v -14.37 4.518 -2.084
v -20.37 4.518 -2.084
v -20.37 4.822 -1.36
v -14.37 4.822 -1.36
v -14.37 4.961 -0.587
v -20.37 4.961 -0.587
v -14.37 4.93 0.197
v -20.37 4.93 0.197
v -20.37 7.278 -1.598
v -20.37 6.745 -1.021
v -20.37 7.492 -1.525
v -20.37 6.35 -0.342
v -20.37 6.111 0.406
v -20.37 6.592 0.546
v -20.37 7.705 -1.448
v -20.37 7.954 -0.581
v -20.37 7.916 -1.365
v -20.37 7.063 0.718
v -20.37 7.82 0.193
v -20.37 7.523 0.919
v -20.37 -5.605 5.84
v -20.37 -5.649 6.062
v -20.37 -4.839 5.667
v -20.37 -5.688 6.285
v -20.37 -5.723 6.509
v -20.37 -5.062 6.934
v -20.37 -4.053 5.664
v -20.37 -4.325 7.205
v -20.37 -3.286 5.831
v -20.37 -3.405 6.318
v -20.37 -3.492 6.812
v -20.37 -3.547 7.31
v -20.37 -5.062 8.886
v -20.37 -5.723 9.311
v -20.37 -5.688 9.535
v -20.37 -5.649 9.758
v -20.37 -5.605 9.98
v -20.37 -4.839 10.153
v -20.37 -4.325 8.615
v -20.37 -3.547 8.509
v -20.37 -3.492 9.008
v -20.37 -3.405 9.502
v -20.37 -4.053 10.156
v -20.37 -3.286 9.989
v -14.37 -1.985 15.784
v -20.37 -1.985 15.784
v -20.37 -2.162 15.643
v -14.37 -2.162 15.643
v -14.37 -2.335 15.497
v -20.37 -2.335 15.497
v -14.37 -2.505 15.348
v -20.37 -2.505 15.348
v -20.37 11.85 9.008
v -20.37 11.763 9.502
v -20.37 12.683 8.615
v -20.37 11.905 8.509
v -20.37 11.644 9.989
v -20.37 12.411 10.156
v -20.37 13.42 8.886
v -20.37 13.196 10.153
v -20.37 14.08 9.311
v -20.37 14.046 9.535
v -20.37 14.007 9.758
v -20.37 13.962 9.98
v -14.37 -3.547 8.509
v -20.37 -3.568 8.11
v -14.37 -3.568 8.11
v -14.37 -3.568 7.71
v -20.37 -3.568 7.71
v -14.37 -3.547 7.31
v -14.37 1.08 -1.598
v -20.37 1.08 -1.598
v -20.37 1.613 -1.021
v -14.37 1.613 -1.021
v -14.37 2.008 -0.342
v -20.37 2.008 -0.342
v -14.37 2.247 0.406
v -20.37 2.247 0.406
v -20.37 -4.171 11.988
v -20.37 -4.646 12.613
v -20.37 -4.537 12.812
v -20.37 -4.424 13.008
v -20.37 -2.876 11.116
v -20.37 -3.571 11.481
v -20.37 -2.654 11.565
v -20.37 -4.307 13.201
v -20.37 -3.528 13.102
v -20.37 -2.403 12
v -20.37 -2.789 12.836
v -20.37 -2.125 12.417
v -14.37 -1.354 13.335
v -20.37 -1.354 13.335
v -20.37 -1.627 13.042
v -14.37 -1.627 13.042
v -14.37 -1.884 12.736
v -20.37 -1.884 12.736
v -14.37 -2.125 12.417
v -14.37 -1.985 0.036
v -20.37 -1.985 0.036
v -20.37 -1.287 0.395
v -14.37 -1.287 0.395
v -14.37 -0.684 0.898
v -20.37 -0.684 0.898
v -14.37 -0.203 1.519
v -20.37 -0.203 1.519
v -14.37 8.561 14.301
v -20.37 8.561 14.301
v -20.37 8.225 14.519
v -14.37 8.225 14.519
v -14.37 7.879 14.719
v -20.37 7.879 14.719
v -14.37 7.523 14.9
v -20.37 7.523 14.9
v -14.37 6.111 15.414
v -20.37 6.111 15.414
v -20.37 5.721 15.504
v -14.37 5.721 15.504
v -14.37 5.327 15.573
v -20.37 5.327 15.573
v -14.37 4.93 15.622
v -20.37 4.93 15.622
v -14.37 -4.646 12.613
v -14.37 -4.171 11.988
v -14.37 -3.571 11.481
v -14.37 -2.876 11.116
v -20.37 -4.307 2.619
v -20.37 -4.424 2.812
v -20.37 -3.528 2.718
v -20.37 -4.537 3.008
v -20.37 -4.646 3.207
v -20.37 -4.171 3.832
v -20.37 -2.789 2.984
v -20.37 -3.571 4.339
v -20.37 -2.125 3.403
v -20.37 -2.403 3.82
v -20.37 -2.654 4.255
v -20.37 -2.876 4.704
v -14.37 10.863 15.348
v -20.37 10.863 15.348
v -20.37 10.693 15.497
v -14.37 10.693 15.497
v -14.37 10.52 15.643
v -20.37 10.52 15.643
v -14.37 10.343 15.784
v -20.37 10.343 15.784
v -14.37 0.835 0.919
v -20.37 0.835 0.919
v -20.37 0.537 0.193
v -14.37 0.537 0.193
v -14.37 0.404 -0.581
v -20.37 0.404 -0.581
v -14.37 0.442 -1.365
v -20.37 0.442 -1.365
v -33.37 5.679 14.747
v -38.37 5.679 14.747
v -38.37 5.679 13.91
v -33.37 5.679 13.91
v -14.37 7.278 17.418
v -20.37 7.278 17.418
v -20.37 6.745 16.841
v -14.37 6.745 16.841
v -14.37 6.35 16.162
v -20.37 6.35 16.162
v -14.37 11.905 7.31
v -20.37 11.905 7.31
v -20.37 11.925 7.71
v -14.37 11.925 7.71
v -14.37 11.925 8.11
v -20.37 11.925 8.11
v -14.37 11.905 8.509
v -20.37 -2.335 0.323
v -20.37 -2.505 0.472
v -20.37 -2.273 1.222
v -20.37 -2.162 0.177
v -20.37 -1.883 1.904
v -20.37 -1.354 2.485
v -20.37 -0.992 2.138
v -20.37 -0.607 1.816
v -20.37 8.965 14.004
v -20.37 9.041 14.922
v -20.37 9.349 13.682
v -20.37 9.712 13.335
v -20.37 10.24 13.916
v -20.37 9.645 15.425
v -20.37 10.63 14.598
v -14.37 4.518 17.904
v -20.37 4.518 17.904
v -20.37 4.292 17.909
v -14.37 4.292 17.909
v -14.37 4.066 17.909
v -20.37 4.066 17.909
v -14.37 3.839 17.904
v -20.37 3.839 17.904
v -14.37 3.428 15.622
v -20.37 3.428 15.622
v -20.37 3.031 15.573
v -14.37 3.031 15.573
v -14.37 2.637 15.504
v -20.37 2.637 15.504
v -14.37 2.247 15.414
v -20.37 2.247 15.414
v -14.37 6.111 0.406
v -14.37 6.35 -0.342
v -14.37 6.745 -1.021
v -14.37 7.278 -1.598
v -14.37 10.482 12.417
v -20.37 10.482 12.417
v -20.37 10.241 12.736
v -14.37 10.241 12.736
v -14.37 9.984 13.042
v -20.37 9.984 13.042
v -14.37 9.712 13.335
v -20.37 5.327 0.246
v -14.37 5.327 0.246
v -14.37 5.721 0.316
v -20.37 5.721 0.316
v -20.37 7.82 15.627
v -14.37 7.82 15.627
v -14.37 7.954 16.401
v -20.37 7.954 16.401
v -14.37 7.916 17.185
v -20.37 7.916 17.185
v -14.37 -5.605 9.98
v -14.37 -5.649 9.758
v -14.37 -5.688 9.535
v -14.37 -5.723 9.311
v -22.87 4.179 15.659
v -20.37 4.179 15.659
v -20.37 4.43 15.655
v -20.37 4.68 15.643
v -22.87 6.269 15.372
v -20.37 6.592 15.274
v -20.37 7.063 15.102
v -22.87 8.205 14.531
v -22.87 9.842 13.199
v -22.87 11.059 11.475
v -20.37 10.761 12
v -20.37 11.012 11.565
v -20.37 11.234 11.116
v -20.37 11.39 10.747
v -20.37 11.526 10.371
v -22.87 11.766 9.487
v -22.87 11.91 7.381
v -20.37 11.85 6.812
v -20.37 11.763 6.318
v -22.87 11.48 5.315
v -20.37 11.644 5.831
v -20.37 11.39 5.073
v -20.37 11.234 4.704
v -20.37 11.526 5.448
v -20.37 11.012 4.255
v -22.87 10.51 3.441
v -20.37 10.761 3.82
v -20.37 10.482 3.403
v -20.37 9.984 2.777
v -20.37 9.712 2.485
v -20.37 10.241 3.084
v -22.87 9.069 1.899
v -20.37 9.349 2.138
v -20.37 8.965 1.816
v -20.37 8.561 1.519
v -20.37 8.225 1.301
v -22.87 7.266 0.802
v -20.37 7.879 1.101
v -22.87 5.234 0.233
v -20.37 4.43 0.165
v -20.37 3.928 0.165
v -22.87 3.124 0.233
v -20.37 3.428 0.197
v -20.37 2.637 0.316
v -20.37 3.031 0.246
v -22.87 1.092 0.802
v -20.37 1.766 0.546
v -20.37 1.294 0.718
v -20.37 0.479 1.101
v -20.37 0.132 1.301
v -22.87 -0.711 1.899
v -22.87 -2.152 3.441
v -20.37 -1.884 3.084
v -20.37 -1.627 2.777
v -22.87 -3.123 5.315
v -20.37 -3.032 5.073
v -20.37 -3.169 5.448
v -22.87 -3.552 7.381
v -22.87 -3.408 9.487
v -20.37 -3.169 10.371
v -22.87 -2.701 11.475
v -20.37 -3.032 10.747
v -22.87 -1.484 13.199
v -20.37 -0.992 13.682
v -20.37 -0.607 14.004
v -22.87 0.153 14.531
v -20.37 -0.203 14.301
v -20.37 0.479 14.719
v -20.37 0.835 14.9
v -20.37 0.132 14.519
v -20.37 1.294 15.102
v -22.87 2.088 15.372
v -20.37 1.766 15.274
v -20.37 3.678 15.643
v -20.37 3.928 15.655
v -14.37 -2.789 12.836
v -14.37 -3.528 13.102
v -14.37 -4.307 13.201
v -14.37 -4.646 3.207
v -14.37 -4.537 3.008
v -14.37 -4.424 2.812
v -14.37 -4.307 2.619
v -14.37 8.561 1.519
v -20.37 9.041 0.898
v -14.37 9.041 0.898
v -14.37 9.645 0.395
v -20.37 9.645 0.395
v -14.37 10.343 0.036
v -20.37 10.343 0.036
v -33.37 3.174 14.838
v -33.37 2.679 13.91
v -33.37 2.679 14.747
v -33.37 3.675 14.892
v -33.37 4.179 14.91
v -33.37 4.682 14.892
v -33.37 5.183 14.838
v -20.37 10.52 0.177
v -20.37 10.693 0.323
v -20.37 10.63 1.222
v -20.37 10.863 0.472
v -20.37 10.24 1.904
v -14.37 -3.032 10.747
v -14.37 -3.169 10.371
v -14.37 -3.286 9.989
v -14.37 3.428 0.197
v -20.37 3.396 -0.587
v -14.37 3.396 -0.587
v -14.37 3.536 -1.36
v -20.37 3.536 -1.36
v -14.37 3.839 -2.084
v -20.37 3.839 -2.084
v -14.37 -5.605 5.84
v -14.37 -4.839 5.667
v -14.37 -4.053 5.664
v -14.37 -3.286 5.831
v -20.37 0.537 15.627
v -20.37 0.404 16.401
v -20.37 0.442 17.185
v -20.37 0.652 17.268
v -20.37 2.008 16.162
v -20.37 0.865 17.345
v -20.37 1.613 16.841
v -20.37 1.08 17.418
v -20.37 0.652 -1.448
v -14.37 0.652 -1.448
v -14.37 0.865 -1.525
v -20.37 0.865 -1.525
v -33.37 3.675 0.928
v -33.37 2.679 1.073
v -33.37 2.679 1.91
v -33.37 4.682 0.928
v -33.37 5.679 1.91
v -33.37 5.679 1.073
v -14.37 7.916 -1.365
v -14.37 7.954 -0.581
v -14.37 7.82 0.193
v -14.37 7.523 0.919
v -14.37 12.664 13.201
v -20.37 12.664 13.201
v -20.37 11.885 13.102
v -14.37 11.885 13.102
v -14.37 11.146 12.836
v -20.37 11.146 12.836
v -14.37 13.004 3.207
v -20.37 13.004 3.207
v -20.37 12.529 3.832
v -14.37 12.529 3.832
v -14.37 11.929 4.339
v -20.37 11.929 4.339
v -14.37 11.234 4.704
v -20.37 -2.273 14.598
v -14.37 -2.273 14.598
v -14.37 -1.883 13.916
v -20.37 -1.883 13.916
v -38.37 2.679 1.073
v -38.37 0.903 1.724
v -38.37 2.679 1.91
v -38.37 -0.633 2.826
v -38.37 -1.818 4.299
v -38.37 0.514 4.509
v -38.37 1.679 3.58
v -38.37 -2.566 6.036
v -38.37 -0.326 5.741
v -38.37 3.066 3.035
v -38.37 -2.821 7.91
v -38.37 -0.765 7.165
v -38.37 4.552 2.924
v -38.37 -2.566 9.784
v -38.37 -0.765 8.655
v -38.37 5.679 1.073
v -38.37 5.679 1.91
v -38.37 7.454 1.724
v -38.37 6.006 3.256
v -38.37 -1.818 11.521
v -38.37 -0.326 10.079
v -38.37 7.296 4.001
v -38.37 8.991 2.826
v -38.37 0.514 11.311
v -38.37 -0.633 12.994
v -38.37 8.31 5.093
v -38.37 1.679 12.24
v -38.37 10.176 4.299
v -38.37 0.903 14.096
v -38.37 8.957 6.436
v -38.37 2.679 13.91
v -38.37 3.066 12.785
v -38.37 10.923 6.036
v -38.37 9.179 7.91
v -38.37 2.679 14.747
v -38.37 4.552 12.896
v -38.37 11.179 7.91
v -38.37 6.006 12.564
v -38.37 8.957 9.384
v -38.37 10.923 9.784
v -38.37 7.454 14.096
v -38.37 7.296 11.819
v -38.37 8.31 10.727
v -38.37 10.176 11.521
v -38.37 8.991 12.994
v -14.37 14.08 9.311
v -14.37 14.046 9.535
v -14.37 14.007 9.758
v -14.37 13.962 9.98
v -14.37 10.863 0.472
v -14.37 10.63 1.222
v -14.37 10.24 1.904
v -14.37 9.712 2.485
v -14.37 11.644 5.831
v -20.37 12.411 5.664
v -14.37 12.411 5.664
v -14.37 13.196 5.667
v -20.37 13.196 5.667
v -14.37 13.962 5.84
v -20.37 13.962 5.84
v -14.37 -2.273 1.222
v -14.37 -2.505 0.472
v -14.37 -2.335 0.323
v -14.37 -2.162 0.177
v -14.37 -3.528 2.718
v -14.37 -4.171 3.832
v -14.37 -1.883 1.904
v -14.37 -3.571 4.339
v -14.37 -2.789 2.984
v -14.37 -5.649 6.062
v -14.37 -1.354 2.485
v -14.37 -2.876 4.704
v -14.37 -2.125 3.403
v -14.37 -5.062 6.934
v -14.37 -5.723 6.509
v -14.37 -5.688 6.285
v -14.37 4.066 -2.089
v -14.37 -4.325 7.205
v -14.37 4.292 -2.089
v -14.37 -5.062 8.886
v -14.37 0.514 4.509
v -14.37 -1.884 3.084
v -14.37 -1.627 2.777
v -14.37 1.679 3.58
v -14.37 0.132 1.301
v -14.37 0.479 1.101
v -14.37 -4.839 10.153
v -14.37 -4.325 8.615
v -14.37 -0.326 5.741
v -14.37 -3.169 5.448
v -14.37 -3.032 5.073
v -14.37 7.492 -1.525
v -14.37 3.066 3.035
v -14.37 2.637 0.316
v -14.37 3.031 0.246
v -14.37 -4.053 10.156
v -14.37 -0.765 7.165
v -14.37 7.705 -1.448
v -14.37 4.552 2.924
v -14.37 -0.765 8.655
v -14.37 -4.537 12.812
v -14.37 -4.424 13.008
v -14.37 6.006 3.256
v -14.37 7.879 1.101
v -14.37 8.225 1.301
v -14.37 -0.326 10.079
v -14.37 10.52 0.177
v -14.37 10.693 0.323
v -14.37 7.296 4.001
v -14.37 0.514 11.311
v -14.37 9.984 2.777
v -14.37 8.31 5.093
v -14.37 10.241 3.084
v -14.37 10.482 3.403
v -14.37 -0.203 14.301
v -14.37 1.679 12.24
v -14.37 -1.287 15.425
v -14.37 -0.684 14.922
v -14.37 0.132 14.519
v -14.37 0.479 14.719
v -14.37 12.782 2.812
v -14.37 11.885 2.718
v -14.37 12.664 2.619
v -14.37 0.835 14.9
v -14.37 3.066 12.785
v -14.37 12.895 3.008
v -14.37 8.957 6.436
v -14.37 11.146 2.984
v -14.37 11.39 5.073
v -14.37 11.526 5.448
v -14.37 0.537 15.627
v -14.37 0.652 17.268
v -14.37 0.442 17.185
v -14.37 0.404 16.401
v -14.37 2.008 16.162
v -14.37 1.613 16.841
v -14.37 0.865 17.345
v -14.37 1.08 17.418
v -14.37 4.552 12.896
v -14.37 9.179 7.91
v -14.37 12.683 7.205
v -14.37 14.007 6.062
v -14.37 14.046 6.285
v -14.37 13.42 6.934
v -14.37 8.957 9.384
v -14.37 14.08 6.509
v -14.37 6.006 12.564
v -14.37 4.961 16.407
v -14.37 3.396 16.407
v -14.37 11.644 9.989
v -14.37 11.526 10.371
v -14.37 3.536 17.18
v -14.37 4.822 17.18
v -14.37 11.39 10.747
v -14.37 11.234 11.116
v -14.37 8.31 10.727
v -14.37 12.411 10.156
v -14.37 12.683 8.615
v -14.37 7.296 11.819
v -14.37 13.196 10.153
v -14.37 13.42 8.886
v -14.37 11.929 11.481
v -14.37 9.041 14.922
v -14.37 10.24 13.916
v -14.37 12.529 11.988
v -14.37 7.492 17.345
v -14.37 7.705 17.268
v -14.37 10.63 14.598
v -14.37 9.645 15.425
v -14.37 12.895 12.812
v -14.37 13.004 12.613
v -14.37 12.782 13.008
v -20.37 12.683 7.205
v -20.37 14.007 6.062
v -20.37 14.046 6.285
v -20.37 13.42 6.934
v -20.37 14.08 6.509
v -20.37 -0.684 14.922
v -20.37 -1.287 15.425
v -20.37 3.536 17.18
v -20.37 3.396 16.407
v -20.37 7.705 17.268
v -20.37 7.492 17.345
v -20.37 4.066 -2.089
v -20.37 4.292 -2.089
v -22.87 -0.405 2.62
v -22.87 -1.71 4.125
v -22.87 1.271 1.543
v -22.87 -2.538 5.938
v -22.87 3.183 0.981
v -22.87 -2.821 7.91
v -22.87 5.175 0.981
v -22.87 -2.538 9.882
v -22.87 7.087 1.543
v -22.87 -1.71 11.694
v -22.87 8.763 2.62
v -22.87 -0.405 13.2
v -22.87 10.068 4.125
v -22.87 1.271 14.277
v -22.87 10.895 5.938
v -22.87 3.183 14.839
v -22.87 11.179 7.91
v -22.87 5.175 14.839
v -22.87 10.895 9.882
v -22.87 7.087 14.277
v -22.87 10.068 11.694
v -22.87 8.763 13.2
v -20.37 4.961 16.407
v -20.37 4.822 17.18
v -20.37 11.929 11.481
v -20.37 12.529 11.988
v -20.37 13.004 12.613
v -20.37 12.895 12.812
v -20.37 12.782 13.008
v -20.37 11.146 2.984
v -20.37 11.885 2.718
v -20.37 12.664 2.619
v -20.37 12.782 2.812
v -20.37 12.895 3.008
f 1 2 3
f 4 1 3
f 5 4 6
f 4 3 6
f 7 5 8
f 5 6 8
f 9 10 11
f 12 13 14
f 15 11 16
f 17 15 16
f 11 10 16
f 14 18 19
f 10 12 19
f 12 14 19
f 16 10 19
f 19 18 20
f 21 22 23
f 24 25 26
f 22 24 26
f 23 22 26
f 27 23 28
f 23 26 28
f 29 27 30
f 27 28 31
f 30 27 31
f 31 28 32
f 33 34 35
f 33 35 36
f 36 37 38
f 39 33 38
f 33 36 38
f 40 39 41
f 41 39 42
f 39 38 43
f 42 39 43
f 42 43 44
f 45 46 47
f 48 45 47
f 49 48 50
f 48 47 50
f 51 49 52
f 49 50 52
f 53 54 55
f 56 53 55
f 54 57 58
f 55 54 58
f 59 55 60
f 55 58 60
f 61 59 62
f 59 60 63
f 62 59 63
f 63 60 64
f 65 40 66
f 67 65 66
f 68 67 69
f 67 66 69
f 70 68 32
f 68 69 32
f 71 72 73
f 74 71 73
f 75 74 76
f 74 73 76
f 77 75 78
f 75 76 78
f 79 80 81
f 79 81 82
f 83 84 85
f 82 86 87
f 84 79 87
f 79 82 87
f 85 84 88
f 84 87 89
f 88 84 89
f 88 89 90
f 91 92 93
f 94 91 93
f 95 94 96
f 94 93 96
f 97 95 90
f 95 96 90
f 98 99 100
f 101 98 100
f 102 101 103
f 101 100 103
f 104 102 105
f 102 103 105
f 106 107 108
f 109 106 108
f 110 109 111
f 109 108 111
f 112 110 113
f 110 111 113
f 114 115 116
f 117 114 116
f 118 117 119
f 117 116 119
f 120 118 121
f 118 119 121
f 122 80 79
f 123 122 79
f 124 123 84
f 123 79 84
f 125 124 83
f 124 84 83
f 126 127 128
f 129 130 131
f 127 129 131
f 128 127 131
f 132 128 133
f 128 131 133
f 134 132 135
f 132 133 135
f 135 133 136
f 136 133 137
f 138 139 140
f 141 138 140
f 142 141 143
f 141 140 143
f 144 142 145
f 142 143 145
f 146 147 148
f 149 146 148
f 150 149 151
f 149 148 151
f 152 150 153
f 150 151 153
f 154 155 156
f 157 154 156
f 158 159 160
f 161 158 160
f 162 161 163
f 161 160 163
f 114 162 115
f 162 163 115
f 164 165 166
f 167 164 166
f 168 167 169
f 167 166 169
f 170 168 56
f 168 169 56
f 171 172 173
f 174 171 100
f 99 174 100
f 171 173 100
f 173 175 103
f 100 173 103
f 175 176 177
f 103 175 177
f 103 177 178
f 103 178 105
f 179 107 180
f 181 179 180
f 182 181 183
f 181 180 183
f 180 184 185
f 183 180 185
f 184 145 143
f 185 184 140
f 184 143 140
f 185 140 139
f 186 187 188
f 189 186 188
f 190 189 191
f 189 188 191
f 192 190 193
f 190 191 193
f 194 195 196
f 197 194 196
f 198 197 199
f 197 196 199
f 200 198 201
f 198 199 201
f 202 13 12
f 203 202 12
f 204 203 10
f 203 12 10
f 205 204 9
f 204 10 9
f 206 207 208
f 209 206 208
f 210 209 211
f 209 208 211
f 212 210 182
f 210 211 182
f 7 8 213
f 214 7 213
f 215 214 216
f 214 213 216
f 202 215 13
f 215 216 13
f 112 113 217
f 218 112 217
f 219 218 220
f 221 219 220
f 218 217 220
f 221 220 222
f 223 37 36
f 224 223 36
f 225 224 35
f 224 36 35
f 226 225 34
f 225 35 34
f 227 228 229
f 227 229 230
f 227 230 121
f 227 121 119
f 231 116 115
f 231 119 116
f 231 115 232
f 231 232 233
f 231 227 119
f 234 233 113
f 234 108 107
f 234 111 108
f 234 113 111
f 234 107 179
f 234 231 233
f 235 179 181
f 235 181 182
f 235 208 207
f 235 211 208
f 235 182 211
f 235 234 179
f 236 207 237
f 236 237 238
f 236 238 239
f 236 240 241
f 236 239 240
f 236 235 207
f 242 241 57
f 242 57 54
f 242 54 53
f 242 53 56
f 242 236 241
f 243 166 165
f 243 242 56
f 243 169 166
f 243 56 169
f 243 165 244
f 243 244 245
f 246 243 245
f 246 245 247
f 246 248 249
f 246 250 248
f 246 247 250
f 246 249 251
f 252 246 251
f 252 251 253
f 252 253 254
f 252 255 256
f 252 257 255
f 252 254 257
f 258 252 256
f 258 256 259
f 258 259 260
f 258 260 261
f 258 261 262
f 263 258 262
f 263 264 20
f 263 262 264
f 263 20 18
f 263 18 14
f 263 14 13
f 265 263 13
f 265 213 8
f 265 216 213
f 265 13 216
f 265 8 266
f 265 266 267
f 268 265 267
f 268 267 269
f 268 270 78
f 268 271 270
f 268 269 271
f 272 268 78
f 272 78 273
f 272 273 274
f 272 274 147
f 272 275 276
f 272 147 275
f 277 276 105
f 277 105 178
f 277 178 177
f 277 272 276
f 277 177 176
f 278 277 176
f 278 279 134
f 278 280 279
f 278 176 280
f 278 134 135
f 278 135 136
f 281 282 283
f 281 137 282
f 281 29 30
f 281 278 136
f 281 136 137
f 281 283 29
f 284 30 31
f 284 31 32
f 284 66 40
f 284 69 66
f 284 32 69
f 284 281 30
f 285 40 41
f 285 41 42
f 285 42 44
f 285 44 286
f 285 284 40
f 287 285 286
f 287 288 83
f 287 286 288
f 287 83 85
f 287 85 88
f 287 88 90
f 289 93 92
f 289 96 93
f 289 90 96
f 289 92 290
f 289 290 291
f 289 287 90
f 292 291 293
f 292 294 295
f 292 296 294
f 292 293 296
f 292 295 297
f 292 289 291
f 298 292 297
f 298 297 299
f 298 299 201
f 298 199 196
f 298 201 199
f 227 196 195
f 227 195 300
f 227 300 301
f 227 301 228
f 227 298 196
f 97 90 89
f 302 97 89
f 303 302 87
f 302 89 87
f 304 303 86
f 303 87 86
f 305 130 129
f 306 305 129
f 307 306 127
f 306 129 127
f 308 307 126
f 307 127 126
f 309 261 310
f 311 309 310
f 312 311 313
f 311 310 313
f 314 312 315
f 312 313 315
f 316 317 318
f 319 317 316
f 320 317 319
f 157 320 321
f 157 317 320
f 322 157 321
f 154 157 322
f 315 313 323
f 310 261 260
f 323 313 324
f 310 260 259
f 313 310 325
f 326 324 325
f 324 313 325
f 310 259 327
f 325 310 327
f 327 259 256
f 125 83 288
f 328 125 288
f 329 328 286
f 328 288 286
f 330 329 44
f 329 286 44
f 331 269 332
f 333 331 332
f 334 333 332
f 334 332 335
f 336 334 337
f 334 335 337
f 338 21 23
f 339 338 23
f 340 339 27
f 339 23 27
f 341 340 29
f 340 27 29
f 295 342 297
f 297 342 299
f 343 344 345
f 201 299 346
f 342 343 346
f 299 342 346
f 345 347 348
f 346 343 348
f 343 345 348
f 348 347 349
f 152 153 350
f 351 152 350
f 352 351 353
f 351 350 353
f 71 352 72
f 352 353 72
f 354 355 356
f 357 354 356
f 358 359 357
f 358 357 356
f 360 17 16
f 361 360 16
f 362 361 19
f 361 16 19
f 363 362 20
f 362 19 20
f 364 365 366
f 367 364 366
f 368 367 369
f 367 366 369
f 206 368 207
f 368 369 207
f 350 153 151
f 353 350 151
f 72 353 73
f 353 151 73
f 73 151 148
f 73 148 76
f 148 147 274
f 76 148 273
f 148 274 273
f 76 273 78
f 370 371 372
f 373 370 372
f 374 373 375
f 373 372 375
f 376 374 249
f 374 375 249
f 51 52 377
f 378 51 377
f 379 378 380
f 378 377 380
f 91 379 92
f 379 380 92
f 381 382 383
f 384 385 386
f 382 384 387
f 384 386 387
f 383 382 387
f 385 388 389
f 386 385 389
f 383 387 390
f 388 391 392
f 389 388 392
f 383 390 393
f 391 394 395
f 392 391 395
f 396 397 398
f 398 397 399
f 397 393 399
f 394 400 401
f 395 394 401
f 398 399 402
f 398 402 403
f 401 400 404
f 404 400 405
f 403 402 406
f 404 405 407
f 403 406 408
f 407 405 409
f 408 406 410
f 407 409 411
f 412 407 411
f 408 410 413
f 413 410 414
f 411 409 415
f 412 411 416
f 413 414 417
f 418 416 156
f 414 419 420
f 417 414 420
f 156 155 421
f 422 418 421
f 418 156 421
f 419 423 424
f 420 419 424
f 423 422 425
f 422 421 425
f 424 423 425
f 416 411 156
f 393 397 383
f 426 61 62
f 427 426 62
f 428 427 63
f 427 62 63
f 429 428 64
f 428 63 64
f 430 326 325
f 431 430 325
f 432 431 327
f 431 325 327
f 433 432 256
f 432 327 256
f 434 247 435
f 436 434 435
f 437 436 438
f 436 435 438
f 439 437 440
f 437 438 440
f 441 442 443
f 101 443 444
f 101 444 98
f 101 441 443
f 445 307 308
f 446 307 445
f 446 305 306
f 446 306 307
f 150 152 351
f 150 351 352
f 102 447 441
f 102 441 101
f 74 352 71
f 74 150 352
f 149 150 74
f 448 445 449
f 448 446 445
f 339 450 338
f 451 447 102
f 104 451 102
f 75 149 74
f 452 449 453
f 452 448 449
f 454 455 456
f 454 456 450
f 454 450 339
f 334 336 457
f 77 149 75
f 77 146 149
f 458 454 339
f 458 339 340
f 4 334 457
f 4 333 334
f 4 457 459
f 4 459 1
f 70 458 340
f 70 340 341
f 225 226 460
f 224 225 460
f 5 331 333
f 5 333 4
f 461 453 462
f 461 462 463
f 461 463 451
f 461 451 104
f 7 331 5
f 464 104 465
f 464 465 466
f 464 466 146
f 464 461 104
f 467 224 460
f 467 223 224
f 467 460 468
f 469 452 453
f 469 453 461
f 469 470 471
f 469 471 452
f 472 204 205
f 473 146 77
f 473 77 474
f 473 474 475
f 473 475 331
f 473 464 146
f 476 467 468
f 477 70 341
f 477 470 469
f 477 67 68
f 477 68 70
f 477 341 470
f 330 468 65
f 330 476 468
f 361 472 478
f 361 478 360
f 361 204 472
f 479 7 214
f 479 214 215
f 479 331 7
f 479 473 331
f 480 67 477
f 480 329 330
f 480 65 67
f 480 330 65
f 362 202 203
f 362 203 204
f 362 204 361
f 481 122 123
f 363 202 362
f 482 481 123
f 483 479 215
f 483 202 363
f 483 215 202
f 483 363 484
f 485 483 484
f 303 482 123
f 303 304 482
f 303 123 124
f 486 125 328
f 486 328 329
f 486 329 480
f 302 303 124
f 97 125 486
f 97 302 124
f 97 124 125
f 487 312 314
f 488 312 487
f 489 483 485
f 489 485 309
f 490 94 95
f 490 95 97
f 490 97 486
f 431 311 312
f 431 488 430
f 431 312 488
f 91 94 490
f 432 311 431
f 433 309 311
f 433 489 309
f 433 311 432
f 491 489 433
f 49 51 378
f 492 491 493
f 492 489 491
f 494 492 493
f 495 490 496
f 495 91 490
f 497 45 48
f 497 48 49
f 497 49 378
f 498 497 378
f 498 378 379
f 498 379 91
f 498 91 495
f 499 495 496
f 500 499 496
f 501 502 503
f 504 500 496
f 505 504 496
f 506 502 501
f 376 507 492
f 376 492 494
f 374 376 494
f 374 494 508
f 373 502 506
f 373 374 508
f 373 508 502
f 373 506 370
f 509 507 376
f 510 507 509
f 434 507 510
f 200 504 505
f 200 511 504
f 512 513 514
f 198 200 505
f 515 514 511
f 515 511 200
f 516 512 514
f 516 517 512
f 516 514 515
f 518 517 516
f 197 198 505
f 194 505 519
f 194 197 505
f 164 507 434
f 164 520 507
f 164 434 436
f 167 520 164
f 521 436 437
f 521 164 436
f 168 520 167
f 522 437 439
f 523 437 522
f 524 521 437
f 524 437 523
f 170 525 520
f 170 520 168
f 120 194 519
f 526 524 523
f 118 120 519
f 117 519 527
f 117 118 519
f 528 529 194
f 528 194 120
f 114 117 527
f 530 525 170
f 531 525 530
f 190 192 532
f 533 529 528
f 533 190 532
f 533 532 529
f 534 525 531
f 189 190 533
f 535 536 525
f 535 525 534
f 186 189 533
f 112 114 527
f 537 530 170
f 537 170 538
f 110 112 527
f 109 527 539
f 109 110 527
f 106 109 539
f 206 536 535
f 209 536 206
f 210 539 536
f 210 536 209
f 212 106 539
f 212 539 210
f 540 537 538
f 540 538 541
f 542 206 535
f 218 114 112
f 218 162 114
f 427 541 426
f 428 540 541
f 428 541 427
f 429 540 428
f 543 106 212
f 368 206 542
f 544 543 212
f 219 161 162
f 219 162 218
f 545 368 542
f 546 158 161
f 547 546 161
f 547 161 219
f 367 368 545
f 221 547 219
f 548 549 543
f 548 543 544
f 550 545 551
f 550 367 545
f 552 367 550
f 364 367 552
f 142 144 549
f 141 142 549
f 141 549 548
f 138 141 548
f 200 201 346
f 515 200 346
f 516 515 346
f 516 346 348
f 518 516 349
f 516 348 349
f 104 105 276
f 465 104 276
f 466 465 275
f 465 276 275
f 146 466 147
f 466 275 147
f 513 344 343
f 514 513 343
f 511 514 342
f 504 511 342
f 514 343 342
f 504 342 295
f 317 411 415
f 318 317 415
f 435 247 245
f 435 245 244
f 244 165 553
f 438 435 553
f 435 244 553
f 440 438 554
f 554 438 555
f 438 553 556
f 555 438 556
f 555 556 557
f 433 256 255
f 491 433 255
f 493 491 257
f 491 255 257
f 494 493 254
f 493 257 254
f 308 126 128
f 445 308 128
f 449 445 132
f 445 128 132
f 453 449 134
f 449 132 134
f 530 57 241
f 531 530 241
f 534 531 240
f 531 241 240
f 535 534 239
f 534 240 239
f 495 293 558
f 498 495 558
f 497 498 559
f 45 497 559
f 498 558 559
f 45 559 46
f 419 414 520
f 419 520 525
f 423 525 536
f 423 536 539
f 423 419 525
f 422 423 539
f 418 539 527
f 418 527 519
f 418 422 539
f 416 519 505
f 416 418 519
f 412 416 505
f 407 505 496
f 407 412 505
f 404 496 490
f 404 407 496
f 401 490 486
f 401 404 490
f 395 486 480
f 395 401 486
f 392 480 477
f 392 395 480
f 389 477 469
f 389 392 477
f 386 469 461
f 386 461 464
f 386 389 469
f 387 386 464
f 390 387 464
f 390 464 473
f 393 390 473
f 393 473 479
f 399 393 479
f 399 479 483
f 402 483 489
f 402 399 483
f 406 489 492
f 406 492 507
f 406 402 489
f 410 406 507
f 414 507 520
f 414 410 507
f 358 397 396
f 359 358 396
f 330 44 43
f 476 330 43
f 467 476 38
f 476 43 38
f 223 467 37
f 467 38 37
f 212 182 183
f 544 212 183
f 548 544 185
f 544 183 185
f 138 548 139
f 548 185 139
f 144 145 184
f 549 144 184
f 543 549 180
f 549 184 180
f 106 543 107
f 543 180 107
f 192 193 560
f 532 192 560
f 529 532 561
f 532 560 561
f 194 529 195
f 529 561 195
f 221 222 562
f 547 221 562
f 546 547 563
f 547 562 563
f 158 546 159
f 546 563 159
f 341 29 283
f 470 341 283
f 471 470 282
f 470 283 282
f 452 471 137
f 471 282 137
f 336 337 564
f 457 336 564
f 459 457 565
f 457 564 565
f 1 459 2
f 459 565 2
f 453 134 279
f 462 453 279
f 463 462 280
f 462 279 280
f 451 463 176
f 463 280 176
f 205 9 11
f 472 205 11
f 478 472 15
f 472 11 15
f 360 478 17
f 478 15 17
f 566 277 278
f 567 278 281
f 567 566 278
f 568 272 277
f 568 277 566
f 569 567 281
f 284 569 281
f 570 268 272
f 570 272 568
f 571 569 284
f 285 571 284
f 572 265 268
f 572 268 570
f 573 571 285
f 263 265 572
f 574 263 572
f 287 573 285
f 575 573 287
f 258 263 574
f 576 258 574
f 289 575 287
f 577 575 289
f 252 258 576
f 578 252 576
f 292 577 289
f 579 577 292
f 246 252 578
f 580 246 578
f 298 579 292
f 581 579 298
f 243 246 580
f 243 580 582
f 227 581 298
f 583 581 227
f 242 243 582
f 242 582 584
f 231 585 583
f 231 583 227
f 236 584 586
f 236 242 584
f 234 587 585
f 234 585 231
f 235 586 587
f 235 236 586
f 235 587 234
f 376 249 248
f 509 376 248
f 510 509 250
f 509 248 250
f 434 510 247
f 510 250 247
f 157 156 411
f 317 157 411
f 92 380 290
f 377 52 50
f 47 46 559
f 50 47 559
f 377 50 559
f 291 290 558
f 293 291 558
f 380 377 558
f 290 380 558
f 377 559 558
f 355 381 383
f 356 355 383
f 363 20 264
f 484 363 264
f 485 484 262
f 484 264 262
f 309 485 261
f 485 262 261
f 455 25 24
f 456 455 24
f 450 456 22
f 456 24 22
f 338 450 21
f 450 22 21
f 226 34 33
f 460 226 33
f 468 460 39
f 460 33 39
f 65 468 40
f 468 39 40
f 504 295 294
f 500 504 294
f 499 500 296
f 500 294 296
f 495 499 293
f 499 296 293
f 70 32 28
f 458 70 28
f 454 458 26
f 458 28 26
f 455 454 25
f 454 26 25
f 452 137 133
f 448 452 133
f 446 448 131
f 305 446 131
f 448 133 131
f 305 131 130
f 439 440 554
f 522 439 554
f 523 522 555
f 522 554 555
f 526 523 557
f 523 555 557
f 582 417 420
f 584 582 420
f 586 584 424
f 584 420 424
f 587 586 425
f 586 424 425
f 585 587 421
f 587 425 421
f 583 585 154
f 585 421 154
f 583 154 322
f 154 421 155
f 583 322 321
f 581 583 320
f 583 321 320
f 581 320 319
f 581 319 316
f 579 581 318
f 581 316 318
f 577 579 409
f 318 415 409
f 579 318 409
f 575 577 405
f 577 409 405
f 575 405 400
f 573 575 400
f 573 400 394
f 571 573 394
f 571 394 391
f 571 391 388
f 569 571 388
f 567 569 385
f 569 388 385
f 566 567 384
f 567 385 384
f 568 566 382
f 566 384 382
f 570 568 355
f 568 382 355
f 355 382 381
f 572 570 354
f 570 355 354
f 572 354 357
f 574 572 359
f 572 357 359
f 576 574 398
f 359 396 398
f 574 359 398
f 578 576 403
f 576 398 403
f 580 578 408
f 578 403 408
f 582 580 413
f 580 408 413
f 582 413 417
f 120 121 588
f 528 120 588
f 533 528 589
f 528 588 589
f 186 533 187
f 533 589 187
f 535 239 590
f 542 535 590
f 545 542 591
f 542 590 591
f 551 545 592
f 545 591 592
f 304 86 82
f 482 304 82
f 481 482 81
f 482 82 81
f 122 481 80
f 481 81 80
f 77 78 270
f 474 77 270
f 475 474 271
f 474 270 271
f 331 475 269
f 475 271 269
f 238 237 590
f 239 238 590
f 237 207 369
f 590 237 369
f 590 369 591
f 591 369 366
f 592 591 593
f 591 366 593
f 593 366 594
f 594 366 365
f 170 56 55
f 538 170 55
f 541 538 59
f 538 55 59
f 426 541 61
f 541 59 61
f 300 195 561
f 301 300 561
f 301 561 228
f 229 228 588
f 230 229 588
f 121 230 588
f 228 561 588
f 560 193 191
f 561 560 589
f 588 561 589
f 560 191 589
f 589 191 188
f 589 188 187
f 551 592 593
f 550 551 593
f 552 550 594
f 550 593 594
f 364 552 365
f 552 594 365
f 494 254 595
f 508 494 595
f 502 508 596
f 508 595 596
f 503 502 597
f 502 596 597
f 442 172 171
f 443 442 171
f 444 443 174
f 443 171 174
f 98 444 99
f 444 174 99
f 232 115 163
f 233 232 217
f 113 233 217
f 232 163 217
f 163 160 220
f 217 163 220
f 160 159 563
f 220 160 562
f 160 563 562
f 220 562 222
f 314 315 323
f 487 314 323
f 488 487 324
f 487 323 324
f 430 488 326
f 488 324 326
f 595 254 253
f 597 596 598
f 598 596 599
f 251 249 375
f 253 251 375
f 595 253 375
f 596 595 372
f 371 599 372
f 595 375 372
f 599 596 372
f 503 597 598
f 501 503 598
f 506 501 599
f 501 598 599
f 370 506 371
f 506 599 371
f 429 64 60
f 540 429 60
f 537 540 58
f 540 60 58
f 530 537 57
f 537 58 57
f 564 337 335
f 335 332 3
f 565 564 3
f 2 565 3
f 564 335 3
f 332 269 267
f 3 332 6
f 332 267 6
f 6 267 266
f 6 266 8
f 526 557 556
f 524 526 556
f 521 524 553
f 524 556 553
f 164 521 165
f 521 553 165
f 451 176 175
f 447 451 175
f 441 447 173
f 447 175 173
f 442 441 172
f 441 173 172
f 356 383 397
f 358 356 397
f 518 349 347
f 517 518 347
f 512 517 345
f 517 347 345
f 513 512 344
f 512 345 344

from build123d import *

# Parameters (mm, degrees)
SPUR_START                = -38.37009116
SPUR_GEAR_ISO_OUTLINE_R   = 7
SPUR_GEAR_ISO_OUTLINE_R_2 = 5
SPUR_GEAR_ISO_DEPTH       = 24.0000508
SPUR_START_2              = -20.37004036
SPUR_GEAR_ISO_2_OUTLINE_R = 7
SPUR_GEAR_ISO_2_DEPTH     = 6
CUT_EXTRUDE1_DEPTH        = 5
BOSS_EXTRUDE1_START       = 2.5
SKETCH2_R                 = 7.749
SKETCH2_R_2               = 7
BOSS_EXTRUDE1_DEPTH       = 2.5


# Read off the part's stored shape, not the designer's step: spur gear_iso
with BuildPart() as part:
    # spur gear_iso outline → spur gear_iso (new body)
    with BuildSketch(Plane.YZ.offset(SPUR_START)):
        with Locations((4.178828844, 7.909958029)):
            Circle(SPUR_GEAR_ISO_OUTLINE_R)
        with Locations((4.178828844, 7.909958029)):
            Circle(SPUR_GEAR_ISO_OUTLINE_R_2, mode=Mode.SUBTRACT)
    extrude(amount=SPUR_GEAR_ISO_DEPTH)

    # spur gear_iso 2 outline → spur gear_iso 2 (add)
    with BuildSketch(Plane.YZ.offset(SPUR_START_2)):
        with BuildLine():
            ThreePointArc((10.863081906, 15.347750779), (10.606704941, 15.57040246), (10.342916446, 15.784221425))
            ThreePointArc((10.342916446, 15.784221425), (9.329220993, 15.189966754), (8.560887593, 14.300933081))
            ThreePointArc((8.560887593, 14.300933081), (8.053328844, 14.620788883), (7.522546219, 14.900419753))
            ThreePointArc((7.522546219, 14.900419753), (7.908305264, 16.010332833), (7.916097179, 17.185346182))
            ThreePointArc((7.916097179, 17.185346182), (7.599030277, 17.306884237), (7.278019782, 17.417587362))
            ThreePointArc((7.278019782, 17.417587362), (6.528704713, 16.512466369), (6.110774911, 15.414262487))
            ThreePointArc((6.110774911, 15.414262487), (5.524428573, 15.541233307), (4.930016667, 15.622462023))
            ThreePointArc((4.930016667, 15.622462023), (4.912898964, 16.797376517), (4.518342735, 17.904192883))
            ThreePointArc((4.518342735, 17.904192883), (4.178828843, 17.909958029), (3.839314952, 17.904192883))
            ThreePointArc((3.839314952, 17.904192883), (3.444758723, 16.797376517), (3.427641021, 15.622462023))
            ThreePointArc((3.427641021, 15.622462023), (2.833229115, 15.541233307), (2.246882776, 15.414262487))
            ThreePointArc((2.246882776, 15.414262487), (1.828952974, 16.512466369), (1.079637905, 17.417587362))
            ThreePointArc((1.079637905, 17.417587362), (0.75862741, 17.306884237), (0.441560508, 17.185346182))
            ThreePointArc((0.441560508, 17.185346182), (0.449352423, 16.010332833), (0.835111468, 14.900419753))
            ThreePointArc((0.835111468, 14.900419753), (0.304328844, 14.620788883), (-0.203229906, 14.300933081))
            ThreePointArc((-0.203229906, 14.300933081), (-0.971563306, 15.189966754), (-1.985258759, 15.784221425))
            ThreePointArc((-1.985258759, 15.784221425), (-2.249047253, 15.57040246), (-2.505424219, 15.347750779))
            ThreePointArc((-2.505424219, 15.347750779), (-2.09622398, 14.246264397), (-1.354116421, 13.335224631))
            ThreePointArc((-1.354116421, 13.335224631), (-1.757249546, 12.890919217), (-2.12480163, 12.416757764))
            ThreePointArc((-2.12480163, 12.416757764), (-3.150866281, 12.989390646), (-4.306675485, 13.201103111))
            ThreePointArc((-4.306675485, 13.201103111), (-4.481425194, 12.909958029), (-4.646189377, 12.613047801))
            ThreePointArc((-4.646189377, 12.613047801), (-3.884936401, 11.717943901), (-2.875989453, 11.115662288))
            ThreePointArc((-2.875989453, 11.115662288), (-3.102849275, 10.56027212), (-3.286062488, 9.988995885))
            ThreePointArc((-3.286062488, 9.988995885), (-4.446099849, 10.17616), (-5.604615157, 9.979794611))
            ThreePointArc((-5.604615157, 9.979794611), (-5.669248686, 9.646439806), (-5.722527095, 9.311082786))
            ThreePointArc((-5.722527095, 9.311082786), (-4.701039727, 8.730324108), (-3.546947281, 8.509444701))
            ThreePointArc((-3.546947281, 8.509444701), (-3.570171156, 7.909958029), (-3.546947281, 7.310471357))
            ThreePointArc((-3.546947281, 7.310471357), (-4.701039727, 7.089591951), (-5.722527095, 6.508833272))
            ThreePointArc((-5.722527095, 6.508833272), (-5.669248686, 6.173476252), (-5.604615157, 5.840121447))
            ThreePointArc((-5.604615157, 5.840121447), (-4.446099849, 5.643756058), (-3.286062488, 5.830920173))
            ThreePointArc((-3.286062488, 5.830920173), (-3.102849275, 5.259643938), (-2.875989453, 4.70425377))
            ThreePointArc((-2.875989453, 4.70425377), (-3.884936402, 4.101972158), (-4.646189377, 3.206868257))
            ThreePointArc((-4.646189377, 3.206868257), (-4.481425194, 2.909958029), (-4.306675485, 2.618812947))
            ThreePointArc((-4.306675485, 2.618812947), (-3.15086628, 2.830525412), (-2.12480163, 3.403158295))
            ThreePointArc((-2.12480163, 3.403158295), (-1.757249546, 2.928996842), (-1.354116421, 2.484691427))
            ThreePointArc((-1.354116421, 2.484691427), (-2.09622398, 1.573651661), (-2.505424219, 0.472165279))
            ThreePointArc((-2.505424219, 0.472165279), (-2.249047253, 0.249513598), (-1.985258759, 0.035694633))
            ThreePointArc((-1.985258759, 0.035694633), (-0.971563306, 0.629949304), (-0.203229906, 1.518982977))
            ThreePointArc((-0.203229906, 1.518982977), (0.304328844, 1.199127175), (0.835111468, 0.919496305))
            ThreePointArc((0.835111468, 0.919496305), (0.449352423, -0.190416775), (0.441560508, -1.365430124))
            ThreePointArc((0.441560508, -1.365430124), (0.75862741, -1.486968179), (1.079637905, -1.597671303))
            ThreePointArc((1.079637905, -1.597671303), (1.828952974, -0.69255031), (2.246882776, 0.405653572))
            ThreePointArc((2.246882776, 0.405653572), (2.833229115, 0.278682751), (3.427641021, 0.197454035))
            ThreePointArc((3.427641021, 0.197454035), (3.444758723, -0.977460459), (3.839314952, -2.084276825))
            ThreePointArc((3.839314952, -2.084276825), (4.178828843, -2.090041971), (4.518342735, -2.084276825))
            ThreePointArc((4.518342735, -2.084276825), (4.912898964, -0.977460459), (4.930016667, 0.197454035))
            ThreePointArc((4.930016667, 0.197454035), (5.524428573, 0.278682751), (6.110774911, 0.405653572))
            ThreePointArc((6.110774911, 0.405653572), (6.528704713, -0.69255031), (7.278019782, -1.597671303))
            ThreePointArc((7.278019782, -1.597671303), (7.599030277, -1.486968179), (7.916097179, -1.365430124))
            ThreePointArc((7.916097179, -1.365430124), (7.908305264, -0.190416775), (7.522546219, 0.919496305))
            ThreePointArc((7.522546219, 0.919496305), (8.053328844, 1.199127175), (8.560887593, 1.518982977))
            ThreePointArc((8.560887593, 1.518982977), (9.329220993, 0.629949304), (10.342916446, 0.035694633))
            ThreePointArc((10.342916446, 0.035694633), (10.606704941, 0.249513598), (10.863081906, 0.472165279))
            ThreePointArc((10.863081906, 0.472165279), (10.453881667, 1.573651661), (9.711774108, 2.484691427))
            ThreePointArc((9.711774108, 2.484691427), (10.114907233, 2.928996842), (10.482459318, 3.403158295))
            ThreePointArc((10.482459318, 3.403158295), (11.508523968, 2.830525412), (12.664333173, 2.618812947))
            ThreePointArc((12.664333173, 2.618812947), (12.839082882, 2.909958029), (13.003847064, 3.206868257))
            ThreePointArc((13.003847064, 3.206868257), (12.242594089, 4.101972158), (11.233647141, 4.70425377))
            ThreePointArc((11.233647141, 4.70425377), (11.460506962, 5.259643939), (11.643720175, 5.830920173))
            ThreePointArc((11.643720175, 5.830920173), (12.803757537, 5.643756058), (13.962272845, 5.840121447))
            ThreePointArc((13.962272845, 5.840121447), (14.026906374, 6.173476252), (14.080184782, 6.508833272))
            ThreePointArc((14.080184782, 6.508833272), (13.058697415, 7.089591951), (11.904604969, 7.310471357))
            ThreePointArc((11.904604969, 7.310471357), (11.927828844, 7.909958029), (11.904604969, 8.509444701))
            ThreePointArc((11.904604969, 8.509444701), (13.058697414, 8.730324108), (14.080184782, 9.311082786))
            ThreePointArc((14.080184782, 9.311082786), (14.026906374, 9.646439806), (13.962272845, 9.979794611))
            ThreePointArc((13.962272845, 9.979794611), (12.803757537, 10.17616), (11.643720175, 9.988995885))
            ThreePointArc((11.643720175, 9.988995885), (11.460506962, 10.56027212), (11.233647141, 11.115662288))
            ThreePointArc((11.233647141, 11.115662288), (12.242594089, 11.717943901), (13.003847064, 12.613047801))
            ThreePointArc((13.003847064, 12.613047801), (12.839082882, 12.909958029), (12.664333173, 13.201103111))
            ThreePointArc((12.664333173, 13.201103111), (11.508523969, 12.989390646), (10.482459318, 12.416757764))
            ThreePointArc((10.482459318, 12.416757764), (10.114907233, 12.890919217), (9.711774108, 13.335224631))
            ThreePointArc((9.711774108, 13.335224631), (10.453881667, 14.246264397), (10.863081906, 15.347750779))
        make_face()
        with Locations((4.178828844, 7.909958029)):
            Circle(SPUR_GEAR_ISO_2_OUTLINE_R, mode=Mode.SUBTRACT)
    extrude(amount=SPUR_GEAR_ISO_2_DEPTH)

    # Sketch1 → Cut-Extrude1 (cut)
    with BuildSketch(Plane.ZY.offset(38.37009116)):
        with BuildLine():
            ThreePointArc((1.072560864, 5.678828844), (0.909958029, 4.178828844), (1.072560864, 2.678828844))
            Line((1.072560864, 2.678828844), (1.909958029, 2.678828844))
            Line((1.909958029, 2.678828844), (1.909958029, 5.678828844))
            Line((1.909958029, 5.678828844), (1.072560864, 5.678828844))
        make_face()
        with BuildLine():
            Line((13.909958029, 2.678828844), (14.747355195, 2.678828844))
            ThreePointArc((14.747355195, 2.678828844), (14.869188596, 3.4244351), (14.909958029, 4.178828844))
            ThreePointArc((14.909958029, 4.178828844), (14.869188596, 4.933222587), (14.747355195, 5.678828844))
            Line((14.747355195, 5.678828844), (13.909958029, 5.678828844))
            Line((13.909958029, 5.678828844), (13.909958029, 2.678828844))
        make_face()
    extrude(amount=-CUT_EXTRUDE1_DEPTH, mode=Mode.SUBTRACT)

    # Sketch2 → Boss-Extrude1 (add)
    with BuildSketch(Plane.ZY.offset(20.37004036).offset(BOSS_EXTRUDE1_START)):
        with Locations((7.909958029, 4.178828844)):
            Circle(SKETCH2_R)
        with Locations(Location((7.909958029, 4.178828844, 0), (0, 0, 192.373625116))):
            Circle(SKETCH2_R_2, mode=Mode.SUBTRACT)
    extrude(amount=-BOSS_EXTRUDE1_DEPTH)


solid = part.part
